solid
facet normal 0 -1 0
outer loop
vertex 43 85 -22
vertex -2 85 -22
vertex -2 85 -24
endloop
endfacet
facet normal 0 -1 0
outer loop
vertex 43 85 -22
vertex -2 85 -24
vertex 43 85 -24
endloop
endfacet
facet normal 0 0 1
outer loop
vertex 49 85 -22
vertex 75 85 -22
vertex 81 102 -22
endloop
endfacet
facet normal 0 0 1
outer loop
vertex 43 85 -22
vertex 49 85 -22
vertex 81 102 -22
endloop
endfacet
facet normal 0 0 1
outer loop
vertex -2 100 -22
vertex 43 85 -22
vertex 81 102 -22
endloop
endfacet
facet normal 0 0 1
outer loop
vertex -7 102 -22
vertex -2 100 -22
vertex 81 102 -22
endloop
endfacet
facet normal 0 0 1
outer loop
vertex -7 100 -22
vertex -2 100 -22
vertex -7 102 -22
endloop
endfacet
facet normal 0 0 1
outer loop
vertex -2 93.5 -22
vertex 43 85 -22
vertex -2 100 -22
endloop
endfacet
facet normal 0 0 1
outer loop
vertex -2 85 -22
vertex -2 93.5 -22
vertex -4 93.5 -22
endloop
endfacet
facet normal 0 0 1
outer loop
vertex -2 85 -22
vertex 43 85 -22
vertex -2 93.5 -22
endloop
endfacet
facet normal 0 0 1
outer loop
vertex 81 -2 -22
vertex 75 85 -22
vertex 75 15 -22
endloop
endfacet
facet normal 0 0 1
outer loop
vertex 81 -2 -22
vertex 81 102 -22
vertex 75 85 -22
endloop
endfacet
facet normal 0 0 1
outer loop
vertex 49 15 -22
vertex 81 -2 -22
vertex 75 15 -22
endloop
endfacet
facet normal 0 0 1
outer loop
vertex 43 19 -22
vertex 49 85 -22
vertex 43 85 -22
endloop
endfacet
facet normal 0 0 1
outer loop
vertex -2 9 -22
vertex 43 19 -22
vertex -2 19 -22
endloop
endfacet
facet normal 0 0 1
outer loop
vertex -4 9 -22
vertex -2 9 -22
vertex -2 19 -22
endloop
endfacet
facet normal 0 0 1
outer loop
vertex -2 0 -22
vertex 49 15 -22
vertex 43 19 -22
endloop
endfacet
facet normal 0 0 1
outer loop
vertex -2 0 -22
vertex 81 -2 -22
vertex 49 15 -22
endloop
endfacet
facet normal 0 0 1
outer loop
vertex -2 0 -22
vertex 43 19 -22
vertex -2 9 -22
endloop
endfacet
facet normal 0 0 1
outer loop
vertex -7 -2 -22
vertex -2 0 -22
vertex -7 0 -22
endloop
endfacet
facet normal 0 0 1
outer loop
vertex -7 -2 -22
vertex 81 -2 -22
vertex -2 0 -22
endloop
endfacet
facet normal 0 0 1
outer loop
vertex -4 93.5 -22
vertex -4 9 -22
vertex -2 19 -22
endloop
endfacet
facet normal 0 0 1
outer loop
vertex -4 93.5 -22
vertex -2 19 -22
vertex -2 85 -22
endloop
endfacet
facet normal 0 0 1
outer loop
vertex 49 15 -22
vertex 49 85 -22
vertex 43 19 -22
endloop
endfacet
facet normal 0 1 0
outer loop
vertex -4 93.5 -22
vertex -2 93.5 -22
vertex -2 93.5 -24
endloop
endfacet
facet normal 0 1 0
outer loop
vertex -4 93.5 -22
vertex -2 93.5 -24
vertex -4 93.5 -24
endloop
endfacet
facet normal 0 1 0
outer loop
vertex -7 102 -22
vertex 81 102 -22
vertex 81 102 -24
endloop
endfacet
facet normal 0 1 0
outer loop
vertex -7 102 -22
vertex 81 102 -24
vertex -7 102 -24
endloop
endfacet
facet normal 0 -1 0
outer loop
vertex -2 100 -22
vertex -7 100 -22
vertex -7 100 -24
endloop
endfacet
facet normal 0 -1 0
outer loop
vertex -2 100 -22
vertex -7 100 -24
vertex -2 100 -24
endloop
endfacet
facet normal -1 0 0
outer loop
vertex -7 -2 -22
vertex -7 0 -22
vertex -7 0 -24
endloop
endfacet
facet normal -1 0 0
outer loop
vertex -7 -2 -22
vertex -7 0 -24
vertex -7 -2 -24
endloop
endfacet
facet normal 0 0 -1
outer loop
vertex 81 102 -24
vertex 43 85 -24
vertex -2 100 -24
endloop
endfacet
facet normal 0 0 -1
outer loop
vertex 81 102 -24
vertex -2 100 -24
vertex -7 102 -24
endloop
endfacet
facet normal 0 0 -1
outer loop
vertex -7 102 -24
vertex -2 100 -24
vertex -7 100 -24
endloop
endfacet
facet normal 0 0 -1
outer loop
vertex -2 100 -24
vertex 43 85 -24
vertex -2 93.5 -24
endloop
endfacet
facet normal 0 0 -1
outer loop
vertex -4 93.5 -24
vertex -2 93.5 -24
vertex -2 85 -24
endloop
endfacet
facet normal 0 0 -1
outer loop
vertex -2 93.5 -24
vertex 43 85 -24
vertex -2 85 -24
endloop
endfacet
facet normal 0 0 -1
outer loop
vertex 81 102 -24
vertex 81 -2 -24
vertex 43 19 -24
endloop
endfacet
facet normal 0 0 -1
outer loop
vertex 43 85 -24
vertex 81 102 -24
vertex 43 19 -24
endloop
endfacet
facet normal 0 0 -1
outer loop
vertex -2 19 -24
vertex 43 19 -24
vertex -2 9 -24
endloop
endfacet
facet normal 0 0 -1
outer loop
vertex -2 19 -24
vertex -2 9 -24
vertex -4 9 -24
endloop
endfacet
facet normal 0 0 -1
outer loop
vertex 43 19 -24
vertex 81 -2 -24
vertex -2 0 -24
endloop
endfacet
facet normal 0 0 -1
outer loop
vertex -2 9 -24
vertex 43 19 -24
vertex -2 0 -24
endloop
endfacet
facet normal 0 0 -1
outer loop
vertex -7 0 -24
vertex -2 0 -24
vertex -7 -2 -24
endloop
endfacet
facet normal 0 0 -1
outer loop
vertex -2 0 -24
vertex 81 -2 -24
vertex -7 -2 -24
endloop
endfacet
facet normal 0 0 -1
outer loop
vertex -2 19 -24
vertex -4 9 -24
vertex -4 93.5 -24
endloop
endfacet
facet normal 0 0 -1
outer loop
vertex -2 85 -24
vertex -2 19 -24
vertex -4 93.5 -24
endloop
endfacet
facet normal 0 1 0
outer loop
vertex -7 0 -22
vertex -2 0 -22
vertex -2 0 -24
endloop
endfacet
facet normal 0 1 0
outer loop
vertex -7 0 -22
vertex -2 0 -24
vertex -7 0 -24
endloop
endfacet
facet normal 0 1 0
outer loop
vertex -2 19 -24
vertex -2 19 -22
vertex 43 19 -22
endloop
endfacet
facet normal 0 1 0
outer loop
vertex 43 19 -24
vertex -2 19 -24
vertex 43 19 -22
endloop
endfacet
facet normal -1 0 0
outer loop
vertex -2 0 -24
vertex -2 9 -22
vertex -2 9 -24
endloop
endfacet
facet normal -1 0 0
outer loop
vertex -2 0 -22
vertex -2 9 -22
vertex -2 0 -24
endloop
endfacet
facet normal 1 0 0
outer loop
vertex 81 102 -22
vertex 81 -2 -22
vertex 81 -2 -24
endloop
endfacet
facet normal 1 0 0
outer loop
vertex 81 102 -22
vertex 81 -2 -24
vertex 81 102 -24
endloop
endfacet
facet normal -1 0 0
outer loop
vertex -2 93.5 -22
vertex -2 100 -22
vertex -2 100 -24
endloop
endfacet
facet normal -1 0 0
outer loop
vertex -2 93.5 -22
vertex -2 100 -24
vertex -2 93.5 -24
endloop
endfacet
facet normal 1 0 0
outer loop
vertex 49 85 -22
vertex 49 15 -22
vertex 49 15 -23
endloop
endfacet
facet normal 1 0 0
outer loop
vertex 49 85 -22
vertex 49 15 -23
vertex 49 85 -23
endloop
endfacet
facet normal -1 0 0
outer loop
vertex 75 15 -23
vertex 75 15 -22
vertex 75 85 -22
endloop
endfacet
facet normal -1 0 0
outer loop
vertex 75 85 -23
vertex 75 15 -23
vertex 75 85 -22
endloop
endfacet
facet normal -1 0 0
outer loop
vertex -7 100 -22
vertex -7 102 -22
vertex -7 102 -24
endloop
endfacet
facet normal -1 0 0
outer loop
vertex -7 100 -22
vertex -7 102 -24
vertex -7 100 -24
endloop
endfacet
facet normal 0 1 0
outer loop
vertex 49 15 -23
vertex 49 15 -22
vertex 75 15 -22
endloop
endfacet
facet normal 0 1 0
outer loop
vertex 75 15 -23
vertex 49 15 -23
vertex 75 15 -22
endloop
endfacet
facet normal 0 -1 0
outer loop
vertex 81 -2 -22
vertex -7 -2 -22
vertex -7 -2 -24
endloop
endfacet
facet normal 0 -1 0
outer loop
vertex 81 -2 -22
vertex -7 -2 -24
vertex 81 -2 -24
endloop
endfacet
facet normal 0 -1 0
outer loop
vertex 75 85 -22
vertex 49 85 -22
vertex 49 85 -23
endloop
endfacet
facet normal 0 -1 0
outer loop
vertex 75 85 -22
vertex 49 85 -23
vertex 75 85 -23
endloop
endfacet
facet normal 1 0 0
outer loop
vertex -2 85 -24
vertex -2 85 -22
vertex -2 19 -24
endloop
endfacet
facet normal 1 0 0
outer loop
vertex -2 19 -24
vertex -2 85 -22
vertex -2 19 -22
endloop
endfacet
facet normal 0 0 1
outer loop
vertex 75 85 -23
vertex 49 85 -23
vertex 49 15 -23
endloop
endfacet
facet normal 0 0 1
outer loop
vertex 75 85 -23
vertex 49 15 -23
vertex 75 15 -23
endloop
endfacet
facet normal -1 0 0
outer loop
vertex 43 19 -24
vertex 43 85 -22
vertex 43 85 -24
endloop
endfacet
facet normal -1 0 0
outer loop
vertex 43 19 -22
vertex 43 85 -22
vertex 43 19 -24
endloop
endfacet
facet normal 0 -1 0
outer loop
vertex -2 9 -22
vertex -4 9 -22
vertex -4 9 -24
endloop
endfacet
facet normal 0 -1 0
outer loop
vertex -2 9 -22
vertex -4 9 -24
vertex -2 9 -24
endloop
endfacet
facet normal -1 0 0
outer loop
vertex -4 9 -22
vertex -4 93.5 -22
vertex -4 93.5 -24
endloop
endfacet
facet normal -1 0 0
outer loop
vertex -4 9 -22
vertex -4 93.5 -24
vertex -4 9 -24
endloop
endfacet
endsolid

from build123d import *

# Parameters (mm, degrees)
SKETCH093_W      = 26
SKETCH093_H      = 70
EXTRUDE081_DEPTH = 1
SKETCH_W         = 45
SKETCH_H         = 66
EXTRUDE_DEPTH    = 2


with BuildPart() as extrude081:
    # Sketch093 → Extrude081 (new body, symmetric)
    with BuildSketch(Plane.XY.offset(-22)):
        with Locations((62, 50)):
            Rectangle(SKETCH093_W, SKETCH093_H)
    extrude(amount=EXTRUDE081_DEPTH, both=True)


with BuildPart() as cut012:
    # Sketch → Extrude (new body)
    with BuildSketch(Plane(origin=(0, 0, -22), x_dir=(1, 0, 0), z_dir=(0, 0, -1))):
        Polygon((-7, 2), (81, 2), (81, -102), (-7, -102), (-7, -100), (-2, -100), (-2, -93.5), (-4, -93.5), (-4, -9), (-2, -9), (-2, 0), (-7, 0), align=None)
        with Locations((20.5, -52)):
            Rectangle(SKETCH_W, SKETCH_H, mode=Mode.SUBTRACT)
    extrude(amount=EXTRUDE_DEPTH)

    # Cut012: cut Extrude081
    add(extrude081.part, mode=Mode.SUBTRACT)


solid = cut012.part
